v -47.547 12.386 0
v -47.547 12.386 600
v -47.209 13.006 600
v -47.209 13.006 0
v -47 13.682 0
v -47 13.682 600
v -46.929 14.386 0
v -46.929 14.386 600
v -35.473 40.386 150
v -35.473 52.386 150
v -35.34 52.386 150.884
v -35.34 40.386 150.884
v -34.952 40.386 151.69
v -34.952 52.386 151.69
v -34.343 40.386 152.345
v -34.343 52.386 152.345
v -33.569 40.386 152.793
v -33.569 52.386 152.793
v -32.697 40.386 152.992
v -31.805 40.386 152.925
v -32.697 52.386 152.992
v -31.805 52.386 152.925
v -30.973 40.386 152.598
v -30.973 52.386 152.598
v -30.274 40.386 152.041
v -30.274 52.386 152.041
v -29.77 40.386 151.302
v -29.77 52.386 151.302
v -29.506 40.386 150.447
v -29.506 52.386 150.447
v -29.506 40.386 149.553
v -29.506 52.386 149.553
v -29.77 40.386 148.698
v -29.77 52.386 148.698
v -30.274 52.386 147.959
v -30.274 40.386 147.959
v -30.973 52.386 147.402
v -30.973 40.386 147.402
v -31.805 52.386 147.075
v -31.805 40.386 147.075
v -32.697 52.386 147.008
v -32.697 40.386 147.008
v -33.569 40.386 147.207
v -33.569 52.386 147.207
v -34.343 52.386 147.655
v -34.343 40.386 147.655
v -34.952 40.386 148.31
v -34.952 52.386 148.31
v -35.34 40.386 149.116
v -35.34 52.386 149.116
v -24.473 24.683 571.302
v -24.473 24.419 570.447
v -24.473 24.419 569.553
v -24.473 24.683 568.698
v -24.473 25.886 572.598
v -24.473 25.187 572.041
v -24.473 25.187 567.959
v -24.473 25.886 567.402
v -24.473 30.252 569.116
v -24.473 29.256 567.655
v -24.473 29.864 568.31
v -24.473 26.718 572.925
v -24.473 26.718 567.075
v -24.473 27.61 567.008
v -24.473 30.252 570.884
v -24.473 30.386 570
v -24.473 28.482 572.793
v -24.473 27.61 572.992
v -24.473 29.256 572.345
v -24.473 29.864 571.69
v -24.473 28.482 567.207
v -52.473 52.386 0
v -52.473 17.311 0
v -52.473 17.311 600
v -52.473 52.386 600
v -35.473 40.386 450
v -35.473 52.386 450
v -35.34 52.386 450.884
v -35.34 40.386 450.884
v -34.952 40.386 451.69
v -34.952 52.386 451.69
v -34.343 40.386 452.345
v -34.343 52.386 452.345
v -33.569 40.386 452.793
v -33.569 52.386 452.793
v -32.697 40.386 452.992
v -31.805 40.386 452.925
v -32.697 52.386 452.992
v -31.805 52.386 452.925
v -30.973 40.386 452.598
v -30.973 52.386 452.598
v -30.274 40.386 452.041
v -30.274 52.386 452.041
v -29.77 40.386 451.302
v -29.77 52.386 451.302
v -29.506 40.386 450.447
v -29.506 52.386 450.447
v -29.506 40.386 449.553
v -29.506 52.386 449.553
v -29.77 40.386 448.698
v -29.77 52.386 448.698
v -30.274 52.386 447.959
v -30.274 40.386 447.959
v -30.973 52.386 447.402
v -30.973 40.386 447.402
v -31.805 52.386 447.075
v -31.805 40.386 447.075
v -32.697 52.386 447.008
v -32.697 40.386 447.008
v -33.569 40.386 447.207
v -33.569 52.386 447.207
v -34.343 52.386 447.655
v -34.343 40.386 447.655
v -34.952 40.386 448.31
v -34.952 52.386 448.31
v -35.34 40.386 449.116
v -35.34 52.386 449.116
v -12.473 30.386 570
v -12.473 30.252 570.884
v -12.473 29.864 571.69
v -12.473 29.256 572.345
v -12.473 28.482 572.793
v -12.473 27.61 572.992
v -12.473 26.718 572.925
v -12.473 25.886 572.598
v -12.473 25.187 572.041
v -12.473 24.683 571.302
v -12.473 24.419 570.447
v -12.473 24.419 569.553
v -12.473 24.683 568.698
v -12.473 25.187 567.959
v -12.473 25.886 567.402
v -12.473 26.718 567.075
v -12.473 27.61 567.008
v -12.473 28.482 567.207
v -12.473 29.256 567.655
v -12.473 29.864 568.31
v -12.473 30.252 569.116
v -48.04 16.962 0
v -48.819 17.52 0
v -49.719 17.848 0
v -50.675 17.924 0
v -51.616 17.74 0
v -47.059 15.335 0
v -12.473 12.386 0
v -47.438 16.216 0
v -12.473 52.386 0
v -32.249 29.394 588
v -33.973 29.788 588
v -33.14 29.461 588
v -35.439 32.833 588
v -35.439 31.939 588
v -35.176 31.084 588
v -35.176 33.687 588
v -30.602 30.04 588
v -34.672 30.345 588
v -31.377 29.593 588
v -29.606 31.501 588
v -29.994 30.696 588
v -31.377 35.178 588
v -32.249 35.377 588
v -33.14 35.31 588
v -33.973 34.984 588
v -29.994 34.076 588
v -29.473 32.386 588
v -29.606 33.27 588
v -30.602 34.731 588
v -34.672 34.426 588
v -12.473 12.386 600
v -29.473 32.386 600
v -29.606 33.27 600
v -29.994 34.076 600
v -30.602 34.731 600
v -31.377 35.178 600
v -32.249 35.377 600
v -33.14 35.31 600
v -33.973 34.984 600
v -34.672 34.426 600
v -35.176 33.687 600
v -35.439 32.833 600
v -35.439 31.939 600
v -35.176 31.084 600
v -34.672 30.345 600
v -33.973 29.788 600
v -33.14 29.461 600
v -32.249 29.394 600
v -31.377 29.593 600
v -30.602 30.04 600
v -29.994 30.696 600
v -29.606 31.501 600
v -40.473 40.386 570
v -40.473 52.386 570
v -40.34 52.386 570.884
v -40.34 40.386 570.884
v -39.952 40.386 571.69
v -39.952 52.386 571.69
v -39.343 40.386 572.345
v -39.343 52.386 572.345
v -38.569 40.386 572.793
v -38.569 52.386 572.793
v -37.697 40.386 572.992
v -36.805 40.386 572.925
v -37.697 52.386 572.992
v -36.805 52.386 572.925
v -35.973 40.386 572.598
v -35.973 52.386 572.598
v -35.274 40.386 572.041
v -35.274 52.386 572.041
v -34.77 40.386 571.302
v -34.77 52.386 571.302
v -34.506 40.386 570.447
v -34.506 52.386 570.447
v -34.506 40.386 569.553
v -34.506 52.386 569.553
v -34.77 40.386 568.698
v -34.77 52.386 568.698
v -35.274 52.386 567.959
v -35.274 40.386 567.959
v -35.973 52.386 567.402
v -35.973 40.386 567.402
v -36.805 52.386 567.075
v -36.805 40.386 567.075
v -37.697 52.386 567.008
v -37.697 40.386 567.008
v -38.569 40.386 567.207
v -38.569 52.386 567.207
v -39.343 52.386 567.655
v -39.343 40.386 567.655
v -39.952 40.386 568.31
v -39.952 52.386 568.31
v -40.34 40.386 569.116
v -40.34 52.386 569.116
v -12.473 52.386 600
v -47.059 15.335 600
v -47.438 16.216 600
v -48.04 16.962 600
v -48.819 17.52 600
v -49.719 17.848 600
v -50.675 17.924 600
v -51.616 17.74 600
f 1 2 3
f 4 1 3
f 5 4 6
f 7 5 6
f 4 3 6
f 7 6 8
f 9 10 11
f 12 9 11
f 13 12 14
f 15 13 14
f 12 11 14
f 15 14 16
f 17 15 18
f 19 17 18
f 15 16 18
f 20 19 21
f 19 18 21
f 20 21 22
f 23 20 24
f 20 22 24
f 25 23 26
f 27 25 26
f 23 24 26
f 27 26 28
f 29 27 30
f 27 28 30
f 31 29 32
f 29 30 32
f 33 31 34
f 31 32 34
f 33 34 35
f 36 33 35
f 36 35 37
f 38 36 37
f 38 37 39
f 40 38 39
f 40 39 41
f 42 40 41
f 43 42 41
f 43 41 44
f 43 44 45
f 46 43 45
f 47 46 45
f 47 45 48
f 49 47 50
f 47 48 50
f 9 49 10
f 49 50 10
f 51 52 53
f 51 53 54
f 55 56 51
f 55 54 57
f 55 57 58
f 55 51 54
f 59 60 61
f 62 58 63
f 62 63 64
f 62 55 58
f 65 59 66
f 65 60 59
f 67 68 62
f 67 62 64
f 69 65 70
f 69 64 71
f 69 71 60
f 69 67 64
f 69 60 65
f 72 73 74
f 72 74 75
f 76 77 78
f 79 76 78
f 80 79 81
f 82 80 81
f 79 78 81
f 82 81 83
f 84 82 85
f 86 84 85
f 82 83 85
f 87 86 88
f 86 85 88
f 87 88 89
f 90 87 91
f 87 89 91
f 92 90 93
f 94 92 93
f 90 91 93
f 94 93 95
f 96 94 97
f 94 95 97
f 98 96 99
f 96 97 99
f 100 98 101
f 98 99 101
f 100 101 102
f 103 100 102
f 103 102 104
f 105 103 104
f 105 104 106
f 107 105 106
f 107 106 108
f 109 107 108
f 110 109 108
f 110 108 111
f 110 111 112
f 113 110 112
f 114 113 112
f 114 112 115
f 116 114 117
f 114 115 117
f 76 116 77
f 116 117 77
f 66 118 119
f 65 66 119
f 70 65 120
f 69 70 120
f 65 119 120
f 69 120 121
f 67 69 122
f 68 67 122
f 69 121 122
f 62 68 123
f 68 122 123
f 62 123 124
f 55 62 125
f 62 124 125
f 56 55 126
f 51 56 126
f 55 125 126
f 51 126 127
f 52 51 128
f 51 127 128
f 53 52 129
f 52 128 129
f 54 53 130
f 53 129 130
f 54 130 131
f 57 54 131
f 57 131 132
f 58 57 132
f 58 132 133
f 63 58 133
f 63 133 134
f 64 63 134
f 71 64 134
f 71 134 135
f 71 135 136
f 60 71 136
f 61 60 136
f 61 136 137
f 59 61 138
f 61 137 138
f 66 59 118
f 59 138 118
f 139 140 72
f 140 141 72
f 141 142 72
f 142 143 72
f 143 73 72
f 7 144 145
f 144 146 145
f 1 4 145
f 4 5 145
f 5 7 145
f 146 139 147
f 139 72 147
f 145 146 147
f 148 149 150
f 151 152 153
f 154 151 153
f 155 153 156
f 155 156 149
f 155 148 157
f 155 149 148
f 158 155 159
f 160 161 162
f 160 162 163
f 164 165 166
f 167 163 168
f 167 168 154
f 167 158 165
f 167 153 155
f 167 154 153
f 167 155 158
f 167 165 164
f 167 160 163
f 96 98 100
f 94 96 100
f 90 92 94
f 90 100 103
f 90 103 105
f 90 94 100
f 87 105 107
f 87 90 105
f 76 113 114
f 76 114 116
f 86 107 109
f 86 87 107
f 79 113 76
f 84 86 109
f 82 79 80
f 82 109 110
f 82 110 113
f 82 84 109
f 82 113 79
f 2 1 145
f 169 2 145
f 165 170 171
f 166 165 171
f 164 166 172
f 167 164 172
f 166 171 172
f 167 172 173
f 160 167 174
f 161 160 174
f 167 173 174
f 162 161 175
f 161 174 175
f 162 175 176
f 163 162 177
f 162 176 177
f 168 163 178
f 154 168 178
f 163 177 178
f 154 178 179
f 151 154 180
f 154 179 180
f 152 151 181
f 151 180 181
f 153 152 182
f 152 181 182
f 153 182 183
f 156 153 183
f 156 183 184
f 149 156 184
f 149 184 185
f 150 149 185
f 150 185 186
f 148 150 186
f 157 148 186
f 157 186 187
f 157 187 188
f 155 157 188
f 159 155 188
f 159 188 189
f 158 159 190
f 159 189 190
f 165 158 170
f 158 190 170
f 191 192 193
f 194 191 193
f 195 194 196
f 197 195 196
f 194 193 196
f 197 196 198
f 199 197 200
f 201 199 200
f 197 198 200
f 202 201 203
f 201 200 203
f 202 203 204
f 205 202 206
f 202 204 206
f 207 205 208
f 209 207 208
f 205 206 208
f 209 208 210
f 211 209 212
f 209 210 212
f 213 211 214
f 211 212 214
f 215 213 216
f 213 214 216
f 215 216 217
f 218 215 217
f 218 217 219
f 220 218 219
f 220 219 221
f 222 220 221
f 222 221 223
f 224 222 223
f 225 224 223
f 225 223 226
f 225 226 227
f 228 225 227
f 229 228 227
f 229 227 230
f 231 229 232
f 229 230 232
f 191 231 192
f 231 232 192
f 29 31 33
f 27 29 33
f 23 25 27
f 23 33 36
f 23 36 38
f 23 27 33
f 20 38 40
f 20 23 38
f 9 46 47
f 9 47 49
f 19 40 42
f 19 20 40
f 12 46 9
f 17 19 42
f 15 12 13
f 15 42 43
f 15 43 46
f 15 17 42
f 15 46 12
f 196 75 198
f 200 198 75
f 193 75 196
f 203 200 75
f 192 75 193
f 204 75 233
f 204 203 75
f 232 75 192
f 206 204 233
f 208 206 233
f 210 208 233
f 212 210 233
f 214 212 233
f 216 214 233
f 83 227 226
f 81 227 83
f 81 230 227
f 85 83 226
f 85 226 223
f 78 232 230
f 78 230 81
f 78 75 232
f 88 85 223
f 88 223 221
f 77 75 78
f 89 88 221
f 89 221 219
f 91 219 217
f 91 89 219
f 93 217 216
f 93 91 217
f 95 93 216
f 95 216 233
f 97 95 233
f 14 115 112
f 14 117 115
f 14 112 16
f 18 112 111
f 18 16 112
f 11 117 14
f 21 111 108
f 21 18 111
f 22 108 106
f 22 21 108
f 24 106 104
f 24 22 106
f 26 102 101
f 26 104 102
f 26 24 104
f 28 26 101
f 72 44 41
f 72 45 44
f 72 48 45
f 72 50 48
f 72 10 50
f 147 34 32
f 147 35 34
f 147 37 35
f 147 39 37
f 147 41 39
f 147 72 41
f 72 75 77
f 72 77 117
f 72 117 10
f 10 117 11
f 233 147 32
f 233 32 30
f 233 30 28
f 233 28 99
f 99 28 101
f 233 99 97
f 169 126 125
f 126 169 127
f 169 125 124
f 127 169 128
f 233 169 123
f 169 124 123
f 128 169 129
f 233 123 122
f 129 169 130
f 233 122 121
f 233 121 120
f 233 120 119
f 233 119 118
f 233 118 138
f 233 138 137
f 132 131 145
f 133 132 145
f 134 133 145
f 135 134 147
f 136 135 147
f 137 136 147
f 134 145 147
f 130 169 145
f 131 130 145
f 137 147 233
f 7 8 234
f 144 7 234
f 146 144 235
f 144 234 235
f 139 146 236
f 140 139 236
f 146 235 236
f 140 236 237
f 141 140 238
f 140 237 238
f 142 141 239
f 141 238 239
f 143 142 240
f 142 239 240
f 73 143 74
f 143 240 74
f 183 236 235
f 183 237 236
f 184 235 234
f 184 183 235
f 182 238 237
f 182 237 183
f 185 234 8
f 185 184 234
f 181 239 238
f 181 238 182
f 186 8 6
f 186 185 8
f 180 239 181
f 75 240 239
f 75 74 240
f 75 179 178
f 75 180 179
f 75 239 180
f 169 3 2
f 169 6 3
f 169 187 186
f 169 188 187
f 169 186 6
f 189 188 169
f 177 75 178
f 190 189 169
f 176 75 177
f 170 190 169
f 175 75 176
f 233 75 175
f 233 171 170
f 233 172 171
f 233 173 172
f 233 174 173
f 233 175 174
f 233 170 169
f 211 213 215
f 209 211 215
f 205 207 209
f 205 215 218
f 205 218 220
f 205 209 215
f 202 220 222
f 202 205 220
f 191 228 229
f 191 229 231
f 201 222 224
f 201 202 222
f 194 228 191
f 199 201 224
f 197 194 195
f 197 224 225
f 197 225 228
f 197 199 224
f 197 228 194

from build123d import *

# Parameters (mm, degrees)
F0_W      = 40
F0_H      = 40
F1_DEPTH  = 600
F2_R      = 3
F3_DEPTH  = 12
F4_R      = 3
F5_DEPTH  = 12
F7_DEPTH  = 600
F8_R      = 3
F9_DEPTH  = 12
F10_DEPTH = 12
F11_R     = 3
F12_DEPTH = 12


with BuildPart() as f1:
    # F0 (on Top) → F1 (new body)
    with BuildSketch(Plane.XY):
        with Locations((-32.4728810042, 32.3857110739)):
            Rectangle(F0_W, F0_H)
    extrude(amount=F1_DEPTH)

    # F2 (on face) → F3 (cut)
    with BuildSketch(Plane.YZ.offset(-12.4728810042)):
        with Locations((27.3857110739, 570)):
            Circle(F2_R)
    extrude(amount=-F3_DEPTH, mode=Mode.SUBTRACT)

    # F4 (on face) → F5 (cut)
    with BuildSketch(Plane(origin=(0, 52.3857110739, 0), x_dir=(-1, 0, 0), z_dir=(0, 1, 0))):
        with Locations((37.4728810042, 570)):
            Circle(F4_R)
    extrude(amount=-F5_DEPTH, mode=Mode.SUBTRACT)

    # F6 (on face) → F7 (cut)
    with BuildSketch(Plane.XY.offset(600)):
        with BuildLine():
            ThreePointArc((-47.5474812124, 12.3857110739), (-47.0872668168, 13.3390112528), (-46.9291592401, 14.3857110739))
            ThreePointArc((-46.9291592401, 14.3857110739), (-48.8190187951, 17.5198303656), (-52.4728810042, 17.3111108656))
            Line((-52.4728810042, 17.3111108656), (-52.4728810042, 12.3857110739))
            Line((-52.4728810042, 12.3857110739), (-47.5474812124, 12.3857110739))
        make_face()
    extrude(amount=-F7_DEPTH, mode=Mode.SUBTRACT)

    # F8 (on face) → F9 (cut)
    with BuildSketch(Plane.XY.offset(600)):
        with Locations((-32.4728810042, 32.3857110739)):
            Circle(F8_R)
    extrude(amount=-F9_DEPTH, mode=Mode.SUBTRACT)

    # F4 (on face) → F10 (cut)
    with BuildSketch(Plane(origin=(0, 52.3857110739, 0), x_dir=(-1, 0, 0), z_dir=(0, 1, 0))):
        with Locations((32.4728810042, 450)):
            Circle(F4_R)
    extrude(amount=-F10_DEPTH, mode=Mode.SUBTRACT)

    # F11 (on face) → F12 (cut)
    with BuildSketch(Plane(origin=(0, 52.3857110739, 0), x_dir=(-1, 0, 0), z_dir=(0, 1, 0))):
        with Locations((32.4728810042, 150)):
            Circle(F11_R)
    extrude(amount=-F12_DEPTH, mode=Mode.SUBTRACT)


solid = f1.part
